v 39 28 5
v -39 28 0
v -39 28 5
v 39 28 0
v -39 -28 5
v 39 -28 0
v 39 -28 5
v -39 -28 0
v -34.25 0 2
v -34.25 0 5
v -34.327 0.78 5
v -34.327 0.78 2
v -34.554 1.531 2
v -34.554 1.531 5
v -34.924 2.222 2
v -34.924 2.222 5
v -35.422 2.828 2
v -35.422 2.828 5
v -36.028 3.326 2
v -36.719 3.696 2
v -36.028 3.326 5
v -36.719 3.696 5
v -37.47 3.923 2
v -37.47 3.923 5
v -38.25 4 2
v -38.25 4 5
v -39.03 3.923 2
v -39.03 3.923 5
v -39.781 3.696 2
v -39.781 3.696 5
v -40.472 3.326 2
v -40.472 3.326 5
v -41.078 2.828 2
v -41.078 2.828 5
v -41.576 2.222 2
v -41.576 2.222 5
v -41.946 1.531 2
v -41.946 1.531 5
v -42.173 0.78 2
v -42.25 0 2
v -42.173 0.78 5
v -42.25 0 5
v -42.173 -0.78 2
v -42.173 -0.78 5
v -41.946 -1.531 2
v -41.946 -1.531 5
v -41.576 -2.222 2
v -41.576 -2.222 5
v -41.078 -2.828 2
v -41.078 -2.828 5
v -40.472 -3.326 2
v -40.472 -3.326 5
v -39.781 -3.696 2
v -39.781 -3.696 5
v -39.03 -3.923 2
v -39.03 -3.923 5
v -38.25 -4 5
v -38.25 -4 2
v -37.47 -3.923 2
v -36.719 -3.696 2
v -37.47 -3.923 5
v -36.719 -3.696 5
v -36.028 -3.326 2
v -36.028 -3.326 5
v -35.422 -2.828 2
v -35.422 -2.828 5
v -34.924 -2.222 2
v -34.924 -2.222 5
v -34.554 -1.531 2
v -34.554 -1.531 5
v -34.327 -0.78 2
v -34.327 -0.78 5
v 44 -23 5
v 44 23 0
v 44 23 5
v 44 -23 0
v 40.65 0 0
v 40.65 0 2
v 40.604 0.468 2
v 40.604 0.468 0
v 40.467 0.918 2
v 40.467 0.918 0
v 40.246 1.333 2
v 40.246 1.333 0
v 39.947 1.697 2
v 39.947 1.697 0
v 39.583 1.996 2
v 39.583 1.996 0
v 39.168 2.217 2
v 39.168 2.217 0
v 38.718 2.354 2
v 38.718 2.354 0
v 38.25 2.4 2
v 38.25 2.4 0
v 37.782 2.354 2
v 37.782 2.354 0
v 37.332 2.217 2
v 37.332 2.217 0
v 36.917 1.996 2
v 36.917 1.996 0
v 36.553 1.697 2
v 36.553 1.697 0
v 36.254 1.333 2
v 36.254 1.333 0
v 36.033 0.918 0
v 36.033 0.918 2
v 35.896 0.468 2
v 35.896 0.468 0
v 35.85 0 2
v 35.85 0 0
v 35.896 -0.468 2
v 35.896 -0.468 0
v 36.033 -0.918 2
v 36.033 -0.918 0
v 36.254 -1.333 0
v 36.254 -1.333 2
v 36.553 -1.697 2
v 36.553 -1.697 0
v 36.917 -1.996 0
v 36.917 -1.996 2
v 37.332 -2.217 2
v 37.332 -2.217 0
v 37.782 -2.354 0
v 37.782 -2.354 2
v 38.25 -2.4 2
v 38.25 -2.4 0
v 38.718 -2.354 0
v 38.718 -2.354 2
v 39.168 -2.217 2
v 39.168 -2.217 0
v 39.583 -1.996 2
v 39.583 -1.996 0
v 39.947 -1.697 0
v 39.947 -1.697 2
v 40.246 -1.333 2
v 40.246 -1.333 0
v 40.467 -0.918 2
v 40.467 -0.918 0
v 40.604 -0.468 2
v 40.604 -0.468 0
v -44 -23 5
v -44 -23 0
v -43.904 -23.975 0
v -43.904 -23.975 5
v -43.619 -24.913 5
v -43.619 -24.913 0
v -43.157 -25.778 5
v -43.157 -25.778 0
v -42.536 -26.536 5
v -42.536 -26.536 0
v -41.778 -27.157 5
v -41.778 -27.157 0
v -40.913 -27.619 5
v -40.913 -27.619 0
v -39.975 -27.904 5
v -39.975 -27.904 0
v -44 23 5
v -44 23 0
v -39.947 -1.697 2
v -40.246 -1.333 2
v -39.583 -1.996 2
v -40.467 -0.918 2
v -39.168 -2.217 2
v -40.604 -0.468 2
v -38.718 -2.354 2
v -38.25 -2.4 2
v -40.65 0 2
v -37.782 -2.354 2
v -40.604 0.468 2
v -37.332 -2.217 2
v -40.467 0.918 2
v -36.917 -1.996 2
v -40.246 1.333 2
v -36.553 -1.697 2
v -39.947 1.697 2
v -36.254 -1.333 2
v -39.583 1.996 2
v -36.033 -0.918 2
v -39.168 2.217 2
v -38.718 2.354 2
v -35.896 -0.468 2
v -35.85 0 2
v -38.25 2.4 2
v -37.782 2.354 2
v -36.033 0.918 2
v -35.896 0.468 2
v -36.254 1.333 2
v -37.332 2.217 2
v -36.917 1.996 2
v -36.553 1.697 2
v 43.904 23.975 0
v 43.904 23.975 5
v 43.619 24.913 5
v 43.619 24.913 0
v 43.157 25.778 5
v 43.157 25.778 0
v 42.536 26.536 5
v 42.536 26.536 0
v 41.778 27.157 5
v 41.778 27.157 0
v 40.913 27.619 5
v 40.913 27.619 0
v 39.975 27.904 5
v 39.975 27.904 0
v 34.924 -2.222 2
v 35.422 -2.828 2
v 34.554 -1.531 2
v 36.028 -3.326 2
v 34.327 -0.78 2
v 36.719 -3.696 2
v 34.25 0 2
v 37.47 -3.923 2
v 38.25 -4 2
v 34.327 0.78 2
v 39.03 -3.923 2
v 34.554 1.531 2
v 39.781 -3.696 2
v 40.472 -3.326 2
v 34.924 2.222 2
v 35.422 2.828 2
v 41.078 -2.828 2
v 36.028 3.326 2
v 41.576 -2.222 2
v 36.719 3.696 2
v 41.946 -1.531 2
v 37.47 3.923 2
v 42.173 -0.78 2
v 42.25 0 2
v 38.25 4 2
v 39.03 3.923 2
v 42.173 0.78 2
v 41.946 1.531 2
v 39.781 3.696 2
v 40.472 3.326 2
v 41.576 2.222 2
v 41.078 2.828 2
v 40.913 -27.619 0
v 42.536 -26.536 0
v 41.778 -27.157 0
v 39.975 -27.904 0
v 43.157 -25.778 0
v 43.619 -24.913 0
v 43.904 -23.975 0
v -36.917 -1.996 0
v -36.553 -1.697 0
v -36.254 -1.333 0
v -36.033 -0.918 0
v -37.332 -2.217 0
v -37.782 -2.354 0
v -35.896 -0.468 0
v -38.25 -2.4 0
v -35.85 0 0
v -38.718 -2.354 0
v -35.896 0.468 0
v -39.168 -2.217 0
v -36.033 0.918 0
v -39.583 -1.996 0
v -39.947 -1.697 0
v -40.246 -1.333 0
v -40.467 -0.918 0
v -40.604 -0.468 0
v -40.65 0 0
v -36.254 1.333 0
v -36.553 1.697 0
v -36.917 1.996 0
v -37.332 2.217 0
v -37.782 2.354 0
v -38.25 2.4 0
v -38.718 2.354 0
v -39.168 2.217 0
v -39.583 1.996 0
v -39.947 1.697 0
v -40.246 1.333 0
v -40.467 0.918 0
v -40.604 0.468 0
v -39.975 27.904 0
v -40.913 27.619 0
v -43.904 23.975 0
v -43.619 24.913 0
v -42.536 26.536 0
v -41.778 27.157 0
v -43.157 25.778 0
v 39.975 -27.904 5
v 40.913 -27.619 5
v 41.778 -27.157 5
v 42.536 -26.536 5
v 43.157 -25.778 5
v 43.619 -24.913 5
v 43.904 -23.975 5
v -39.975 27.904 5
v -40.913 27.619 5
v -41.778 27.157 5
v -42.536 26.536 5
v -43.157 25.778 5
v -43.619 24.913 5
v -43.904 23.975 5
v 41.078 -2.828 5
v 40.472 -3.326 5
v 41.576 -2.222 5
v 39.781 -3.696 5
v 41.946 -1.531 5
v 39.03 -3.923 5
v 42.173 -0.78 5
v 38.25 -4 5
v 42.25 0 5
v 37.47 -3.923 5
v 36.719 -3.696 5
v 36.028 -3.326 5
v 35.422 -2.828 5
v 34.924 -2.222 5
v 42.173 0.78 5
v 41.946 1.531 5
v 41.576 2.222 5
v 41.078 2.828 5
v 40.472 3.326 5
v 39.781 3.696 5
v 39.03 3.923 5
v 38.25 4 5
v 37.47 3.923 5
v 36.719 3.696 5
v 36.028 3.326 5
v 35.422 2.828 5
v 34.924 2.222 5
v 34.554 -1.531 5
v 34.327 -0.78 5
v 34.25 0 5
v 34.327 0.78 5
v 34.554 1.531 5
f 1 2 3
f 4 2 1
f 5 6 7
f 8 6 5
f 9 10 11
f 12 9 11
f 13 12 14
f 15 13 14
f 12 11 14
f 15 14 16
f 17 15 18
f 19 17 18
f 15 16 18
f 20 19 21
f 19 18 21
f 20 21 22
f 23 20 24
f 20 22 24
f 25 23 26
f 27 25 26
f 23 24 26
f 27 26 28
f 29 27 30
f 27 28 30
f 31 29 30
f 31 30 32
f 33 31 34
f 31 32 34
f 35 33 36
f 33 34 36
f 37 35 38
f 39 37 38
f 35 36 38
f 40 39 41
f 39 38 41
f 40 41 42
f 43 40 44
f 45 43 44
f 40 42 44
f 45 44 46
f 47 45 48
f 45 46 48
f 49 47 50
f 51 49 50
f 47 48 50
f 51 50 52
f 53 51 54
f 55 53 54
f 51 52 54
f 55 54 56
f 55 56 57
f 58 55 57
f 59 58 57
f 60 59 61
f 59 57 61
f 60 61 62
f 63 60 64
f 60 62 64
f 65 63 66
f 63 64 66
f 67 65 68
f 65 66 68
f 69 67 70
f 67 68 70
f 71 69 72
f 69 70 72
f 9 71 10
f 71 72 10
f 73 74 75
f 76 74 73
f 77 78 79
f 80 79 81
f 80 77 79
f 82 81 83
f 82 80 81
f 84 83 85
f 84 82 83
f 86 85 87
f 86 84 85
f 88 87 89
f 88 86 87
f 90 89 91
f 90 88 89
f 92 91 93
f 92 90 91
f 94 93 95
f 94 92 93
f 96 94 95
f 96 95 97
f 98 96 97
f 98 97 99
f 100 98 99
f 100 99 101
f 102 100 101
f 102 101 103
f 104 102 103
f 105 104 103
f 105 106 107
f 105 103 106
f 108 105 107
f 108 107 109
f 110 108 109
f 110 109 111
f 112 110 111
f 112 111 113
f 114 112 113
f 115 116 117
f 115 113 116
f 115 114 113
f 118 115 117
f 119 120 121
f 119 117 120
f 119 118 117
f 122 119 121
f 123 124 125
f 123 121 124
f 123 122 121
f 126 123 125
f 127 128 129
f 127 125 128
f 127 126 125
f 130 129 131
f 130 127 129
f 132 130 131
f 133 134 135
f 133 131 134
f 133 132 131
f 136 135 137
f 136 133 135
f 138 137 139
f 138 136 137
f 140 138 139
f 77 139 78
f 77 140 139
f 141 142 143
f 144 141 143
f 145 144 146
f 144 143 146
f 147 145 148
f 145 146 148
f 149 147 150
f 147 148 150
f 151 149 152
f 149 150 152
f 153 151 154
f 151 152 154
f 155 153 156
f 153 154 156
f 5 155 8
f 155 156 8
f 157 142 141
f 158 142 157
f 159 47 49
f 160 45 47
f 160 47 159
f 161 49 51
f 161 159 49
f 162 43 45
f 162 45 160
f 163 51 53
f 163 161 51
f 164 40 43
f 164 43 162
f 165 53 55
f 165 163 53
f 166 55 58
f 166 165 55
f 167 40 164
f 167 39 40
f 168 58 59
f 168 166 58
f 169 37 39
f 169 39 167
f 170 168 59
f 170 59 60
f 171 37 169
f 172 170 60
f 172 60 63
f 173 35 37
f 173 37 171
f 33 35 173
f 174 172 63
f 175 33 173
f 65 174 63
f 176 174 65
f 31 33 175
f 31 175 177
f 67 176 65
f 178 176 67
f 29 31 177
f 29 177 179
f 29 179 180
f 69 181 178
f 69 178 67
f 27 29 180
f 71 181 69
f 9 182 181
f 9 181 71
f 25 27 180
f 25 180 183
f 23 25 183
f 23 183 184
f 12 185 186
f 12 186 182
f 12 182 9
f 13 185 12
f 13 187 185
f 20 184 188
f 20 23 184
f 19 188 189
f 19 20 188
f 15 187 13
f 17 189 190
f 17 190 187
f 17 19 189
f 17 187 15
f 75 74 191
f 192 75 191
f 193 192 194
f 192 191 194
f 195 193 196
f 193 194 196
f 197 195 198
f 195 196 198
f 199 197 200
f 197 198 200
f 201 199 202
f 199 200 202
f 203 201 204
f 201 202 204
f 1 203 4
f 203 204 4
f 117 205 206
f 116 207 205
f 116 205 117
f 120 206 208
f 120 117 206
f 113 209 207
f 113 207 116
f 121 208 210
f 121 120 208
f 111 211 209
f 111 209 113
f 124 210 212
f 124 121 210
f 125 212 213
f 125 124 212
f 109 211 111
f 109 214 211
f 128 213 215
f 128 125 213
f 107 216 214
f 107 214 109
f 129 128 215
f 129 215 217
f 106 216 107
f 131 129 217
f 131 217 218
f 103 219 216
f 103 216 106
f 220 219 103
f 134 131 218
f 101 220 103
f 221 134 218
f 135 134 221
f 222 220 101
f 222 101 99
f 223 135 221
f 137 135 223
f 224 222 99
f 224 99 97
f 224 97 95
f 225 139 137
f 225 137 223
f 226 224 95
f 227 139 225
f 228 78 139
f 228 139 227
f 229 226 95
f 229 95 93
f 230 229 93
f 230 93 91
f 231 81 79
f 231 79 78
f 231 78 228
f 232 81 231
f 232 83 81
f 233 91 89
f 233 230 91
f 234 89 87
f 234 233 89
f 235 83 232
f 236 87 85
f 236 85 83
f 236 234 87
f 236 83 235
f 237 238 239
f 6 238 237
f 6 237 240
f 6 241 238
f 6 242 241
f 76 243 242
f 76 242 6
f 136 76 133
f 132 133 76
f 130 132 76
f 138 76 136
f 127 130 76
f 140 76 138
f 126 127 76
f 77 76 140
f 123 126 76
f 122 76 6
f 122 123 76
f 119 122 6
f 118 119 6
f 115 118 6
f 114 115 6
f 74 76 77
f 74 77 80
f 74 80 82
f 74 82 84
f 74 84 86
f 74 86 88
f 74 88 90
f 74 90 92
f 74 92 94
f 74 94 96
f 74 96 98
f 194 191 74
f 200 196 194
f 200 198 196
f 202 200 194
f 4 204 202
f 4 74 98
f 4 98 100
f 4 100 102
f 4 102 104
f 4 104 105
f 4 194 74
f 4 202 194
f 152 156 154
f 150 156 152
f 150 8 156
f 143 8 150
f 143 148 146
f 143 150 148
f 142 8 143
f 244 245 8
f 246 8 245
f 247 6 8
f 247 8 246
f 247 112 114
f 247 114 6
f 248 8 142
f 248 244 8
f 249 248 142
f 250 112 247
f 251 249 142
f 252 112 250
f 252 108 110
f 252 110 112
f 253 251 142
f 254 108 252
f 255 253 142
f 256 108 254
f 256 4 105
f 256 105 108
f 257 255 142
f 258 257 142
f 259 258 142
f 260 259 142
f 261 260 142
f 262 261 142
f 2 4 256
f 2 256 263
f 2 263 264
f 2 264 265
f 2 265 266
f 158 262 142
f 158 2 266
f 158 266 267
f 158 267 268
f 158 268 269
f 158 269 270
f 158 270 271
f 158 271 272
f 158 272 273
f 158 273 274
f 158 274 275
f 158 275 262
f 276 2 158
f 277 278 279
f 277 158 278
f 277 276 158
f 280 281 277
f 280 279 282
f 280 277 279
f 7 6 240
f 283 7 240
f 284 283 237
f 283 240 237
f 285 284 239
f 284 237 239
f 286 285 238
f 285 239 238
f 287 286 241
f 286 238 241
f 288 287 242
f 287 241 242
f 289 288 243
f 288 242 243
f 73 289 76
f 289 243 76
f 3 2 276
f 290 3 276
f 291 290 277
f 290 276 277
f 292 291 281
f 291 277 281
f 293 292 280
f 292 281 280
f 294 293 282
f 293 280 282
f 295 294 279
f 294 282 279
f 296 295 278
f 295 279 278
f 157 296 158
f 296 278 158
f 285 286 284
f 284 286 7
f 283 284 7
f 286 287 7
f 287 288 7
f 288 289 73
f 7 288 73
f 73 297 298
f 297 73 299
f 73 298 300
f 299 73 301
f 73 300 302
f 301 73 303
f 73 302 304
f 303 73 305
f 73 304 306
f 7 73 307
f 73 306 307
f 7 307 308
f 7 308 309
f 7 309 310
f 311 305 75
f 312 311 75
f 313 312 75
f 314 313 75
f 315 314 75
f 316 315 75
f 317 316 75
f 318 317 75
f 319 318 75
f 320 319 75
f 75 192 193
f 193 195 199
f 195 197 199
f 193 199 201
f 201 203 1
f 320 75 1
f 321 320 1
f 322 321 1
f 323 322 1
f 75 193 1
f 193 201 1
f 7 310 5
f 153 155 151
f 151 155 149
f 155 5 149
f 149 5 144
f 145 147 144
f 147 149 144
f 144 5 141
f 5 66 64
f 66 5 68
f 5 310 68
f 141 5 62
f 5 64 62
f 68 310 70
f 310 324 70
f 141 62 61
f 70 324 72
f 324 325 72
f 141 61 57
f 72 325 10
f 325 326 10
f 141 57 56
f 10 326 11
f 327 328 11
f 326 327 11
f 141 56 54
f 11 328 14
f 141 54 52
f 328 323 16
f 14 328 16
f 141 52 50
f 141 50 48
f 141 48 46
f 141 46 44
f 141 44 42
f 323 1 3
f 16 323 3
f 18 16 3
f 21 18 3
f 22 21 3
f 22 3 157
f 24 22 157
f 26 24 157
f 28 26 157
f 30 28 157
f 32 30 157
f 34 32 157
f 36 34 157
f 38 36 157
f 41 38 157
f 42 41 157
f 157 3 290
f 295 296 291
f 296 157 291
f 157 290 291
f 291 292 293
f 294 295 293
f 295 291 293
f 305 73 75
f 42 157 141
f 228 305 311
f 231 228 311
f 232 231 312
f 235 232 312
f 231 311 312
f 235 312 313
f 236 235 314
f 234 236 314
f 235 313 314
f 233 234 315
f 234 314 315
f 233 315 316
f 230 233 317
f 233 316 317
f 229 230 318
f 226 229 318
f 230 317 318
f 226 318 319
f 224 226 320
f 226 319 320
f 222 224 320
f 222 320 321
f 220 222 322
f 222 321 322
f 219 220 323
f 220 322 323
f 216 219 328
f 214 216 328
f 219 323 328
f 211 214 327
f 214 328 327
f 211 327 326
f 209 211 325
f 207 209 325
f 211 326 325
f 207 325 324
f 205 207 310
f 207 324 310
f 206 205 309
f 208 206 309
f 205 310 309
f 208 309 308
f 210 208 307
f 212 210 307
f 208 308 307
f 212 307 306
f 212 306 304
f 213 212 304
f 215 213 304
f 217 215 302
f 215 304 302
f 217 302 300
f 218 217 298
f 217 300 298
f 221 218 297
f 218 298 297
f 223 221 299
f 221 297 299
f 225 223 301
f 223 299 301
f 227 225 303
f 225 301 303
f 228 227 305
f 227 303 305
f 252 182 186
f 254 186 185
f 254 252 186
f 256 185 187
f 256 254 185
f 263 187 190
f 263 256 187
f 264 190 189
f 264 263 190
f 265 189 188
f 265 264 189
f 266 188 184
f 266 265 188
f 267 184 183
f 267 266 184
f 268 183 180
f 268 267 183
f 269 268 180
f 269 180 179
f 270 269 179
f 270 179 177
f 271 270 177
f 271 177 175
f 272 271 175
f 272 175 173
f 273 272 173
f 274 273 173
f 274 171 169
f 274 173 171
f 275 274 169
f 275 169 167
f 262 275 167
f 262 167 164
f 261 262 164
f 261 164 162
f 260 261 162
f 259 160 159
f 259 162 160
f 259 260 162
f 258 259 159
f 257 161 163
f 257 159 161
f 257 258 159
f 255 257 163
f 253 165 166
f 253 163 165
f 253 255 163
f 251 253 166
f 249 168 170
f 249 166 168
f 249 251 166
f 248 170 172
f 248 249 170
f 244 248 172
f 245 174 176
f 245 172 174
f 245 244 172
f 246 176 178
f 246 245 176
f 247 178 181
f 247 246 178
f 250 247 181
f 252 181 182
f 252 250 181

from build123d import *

# Parameters (mm, degrees)
SKETCH_R     = 2.4
PAD_DEPTH    = 5
SKETCH001_R  = 4
POCKET_DEPTH = 3


with BuildPart() as part:
    # Sketch → Pad (new body)
    with BuildSketch(Plane.XY):
        with BuildLine():
            Line((-39, 28), (39, 28))
            ThreePointArc((44, 23), (42.535534, 26.535534), (39, 28))
            Line((44, 23), (44, -23))
            ThreePointArc((39, -28), (42.535534, -26.535534), (44, -23))
            Line((39, -28), (-39, -28))
            ThreePointArc((-44, -23), (-42.535534, -26.535534), (-39, -28))
            Line((-44, -23), (-44, 23))
            ThreePointArc((-39, 28), (-42.535534, 26.535534), (-44, 23))
        make_face()
        with Locations((-38.25, 0)):
            Circle(SKETCH_R, mode=Mode.SUBTRACT)
        with Locations((38.25, 0)):
            Circle(SKETCH_R, mode=Mode.SUBTRACT)
    extrude(amount=PAD_DEPTH)

    # Sketch001 (on Face12 of Pad) → Pocket (cut)
    with BuildSketch(Plane.XY.offset(5)):
        with Locations((-38.25, 0)):
            Circle(SKETCH001_R)
        with Locations((38.25, 0)):
            Circle(SKETCH001_R)
    extrude(amount=-POCKET_DEPTH, mode=Mode.SUBTRACT)


solid = part.part
